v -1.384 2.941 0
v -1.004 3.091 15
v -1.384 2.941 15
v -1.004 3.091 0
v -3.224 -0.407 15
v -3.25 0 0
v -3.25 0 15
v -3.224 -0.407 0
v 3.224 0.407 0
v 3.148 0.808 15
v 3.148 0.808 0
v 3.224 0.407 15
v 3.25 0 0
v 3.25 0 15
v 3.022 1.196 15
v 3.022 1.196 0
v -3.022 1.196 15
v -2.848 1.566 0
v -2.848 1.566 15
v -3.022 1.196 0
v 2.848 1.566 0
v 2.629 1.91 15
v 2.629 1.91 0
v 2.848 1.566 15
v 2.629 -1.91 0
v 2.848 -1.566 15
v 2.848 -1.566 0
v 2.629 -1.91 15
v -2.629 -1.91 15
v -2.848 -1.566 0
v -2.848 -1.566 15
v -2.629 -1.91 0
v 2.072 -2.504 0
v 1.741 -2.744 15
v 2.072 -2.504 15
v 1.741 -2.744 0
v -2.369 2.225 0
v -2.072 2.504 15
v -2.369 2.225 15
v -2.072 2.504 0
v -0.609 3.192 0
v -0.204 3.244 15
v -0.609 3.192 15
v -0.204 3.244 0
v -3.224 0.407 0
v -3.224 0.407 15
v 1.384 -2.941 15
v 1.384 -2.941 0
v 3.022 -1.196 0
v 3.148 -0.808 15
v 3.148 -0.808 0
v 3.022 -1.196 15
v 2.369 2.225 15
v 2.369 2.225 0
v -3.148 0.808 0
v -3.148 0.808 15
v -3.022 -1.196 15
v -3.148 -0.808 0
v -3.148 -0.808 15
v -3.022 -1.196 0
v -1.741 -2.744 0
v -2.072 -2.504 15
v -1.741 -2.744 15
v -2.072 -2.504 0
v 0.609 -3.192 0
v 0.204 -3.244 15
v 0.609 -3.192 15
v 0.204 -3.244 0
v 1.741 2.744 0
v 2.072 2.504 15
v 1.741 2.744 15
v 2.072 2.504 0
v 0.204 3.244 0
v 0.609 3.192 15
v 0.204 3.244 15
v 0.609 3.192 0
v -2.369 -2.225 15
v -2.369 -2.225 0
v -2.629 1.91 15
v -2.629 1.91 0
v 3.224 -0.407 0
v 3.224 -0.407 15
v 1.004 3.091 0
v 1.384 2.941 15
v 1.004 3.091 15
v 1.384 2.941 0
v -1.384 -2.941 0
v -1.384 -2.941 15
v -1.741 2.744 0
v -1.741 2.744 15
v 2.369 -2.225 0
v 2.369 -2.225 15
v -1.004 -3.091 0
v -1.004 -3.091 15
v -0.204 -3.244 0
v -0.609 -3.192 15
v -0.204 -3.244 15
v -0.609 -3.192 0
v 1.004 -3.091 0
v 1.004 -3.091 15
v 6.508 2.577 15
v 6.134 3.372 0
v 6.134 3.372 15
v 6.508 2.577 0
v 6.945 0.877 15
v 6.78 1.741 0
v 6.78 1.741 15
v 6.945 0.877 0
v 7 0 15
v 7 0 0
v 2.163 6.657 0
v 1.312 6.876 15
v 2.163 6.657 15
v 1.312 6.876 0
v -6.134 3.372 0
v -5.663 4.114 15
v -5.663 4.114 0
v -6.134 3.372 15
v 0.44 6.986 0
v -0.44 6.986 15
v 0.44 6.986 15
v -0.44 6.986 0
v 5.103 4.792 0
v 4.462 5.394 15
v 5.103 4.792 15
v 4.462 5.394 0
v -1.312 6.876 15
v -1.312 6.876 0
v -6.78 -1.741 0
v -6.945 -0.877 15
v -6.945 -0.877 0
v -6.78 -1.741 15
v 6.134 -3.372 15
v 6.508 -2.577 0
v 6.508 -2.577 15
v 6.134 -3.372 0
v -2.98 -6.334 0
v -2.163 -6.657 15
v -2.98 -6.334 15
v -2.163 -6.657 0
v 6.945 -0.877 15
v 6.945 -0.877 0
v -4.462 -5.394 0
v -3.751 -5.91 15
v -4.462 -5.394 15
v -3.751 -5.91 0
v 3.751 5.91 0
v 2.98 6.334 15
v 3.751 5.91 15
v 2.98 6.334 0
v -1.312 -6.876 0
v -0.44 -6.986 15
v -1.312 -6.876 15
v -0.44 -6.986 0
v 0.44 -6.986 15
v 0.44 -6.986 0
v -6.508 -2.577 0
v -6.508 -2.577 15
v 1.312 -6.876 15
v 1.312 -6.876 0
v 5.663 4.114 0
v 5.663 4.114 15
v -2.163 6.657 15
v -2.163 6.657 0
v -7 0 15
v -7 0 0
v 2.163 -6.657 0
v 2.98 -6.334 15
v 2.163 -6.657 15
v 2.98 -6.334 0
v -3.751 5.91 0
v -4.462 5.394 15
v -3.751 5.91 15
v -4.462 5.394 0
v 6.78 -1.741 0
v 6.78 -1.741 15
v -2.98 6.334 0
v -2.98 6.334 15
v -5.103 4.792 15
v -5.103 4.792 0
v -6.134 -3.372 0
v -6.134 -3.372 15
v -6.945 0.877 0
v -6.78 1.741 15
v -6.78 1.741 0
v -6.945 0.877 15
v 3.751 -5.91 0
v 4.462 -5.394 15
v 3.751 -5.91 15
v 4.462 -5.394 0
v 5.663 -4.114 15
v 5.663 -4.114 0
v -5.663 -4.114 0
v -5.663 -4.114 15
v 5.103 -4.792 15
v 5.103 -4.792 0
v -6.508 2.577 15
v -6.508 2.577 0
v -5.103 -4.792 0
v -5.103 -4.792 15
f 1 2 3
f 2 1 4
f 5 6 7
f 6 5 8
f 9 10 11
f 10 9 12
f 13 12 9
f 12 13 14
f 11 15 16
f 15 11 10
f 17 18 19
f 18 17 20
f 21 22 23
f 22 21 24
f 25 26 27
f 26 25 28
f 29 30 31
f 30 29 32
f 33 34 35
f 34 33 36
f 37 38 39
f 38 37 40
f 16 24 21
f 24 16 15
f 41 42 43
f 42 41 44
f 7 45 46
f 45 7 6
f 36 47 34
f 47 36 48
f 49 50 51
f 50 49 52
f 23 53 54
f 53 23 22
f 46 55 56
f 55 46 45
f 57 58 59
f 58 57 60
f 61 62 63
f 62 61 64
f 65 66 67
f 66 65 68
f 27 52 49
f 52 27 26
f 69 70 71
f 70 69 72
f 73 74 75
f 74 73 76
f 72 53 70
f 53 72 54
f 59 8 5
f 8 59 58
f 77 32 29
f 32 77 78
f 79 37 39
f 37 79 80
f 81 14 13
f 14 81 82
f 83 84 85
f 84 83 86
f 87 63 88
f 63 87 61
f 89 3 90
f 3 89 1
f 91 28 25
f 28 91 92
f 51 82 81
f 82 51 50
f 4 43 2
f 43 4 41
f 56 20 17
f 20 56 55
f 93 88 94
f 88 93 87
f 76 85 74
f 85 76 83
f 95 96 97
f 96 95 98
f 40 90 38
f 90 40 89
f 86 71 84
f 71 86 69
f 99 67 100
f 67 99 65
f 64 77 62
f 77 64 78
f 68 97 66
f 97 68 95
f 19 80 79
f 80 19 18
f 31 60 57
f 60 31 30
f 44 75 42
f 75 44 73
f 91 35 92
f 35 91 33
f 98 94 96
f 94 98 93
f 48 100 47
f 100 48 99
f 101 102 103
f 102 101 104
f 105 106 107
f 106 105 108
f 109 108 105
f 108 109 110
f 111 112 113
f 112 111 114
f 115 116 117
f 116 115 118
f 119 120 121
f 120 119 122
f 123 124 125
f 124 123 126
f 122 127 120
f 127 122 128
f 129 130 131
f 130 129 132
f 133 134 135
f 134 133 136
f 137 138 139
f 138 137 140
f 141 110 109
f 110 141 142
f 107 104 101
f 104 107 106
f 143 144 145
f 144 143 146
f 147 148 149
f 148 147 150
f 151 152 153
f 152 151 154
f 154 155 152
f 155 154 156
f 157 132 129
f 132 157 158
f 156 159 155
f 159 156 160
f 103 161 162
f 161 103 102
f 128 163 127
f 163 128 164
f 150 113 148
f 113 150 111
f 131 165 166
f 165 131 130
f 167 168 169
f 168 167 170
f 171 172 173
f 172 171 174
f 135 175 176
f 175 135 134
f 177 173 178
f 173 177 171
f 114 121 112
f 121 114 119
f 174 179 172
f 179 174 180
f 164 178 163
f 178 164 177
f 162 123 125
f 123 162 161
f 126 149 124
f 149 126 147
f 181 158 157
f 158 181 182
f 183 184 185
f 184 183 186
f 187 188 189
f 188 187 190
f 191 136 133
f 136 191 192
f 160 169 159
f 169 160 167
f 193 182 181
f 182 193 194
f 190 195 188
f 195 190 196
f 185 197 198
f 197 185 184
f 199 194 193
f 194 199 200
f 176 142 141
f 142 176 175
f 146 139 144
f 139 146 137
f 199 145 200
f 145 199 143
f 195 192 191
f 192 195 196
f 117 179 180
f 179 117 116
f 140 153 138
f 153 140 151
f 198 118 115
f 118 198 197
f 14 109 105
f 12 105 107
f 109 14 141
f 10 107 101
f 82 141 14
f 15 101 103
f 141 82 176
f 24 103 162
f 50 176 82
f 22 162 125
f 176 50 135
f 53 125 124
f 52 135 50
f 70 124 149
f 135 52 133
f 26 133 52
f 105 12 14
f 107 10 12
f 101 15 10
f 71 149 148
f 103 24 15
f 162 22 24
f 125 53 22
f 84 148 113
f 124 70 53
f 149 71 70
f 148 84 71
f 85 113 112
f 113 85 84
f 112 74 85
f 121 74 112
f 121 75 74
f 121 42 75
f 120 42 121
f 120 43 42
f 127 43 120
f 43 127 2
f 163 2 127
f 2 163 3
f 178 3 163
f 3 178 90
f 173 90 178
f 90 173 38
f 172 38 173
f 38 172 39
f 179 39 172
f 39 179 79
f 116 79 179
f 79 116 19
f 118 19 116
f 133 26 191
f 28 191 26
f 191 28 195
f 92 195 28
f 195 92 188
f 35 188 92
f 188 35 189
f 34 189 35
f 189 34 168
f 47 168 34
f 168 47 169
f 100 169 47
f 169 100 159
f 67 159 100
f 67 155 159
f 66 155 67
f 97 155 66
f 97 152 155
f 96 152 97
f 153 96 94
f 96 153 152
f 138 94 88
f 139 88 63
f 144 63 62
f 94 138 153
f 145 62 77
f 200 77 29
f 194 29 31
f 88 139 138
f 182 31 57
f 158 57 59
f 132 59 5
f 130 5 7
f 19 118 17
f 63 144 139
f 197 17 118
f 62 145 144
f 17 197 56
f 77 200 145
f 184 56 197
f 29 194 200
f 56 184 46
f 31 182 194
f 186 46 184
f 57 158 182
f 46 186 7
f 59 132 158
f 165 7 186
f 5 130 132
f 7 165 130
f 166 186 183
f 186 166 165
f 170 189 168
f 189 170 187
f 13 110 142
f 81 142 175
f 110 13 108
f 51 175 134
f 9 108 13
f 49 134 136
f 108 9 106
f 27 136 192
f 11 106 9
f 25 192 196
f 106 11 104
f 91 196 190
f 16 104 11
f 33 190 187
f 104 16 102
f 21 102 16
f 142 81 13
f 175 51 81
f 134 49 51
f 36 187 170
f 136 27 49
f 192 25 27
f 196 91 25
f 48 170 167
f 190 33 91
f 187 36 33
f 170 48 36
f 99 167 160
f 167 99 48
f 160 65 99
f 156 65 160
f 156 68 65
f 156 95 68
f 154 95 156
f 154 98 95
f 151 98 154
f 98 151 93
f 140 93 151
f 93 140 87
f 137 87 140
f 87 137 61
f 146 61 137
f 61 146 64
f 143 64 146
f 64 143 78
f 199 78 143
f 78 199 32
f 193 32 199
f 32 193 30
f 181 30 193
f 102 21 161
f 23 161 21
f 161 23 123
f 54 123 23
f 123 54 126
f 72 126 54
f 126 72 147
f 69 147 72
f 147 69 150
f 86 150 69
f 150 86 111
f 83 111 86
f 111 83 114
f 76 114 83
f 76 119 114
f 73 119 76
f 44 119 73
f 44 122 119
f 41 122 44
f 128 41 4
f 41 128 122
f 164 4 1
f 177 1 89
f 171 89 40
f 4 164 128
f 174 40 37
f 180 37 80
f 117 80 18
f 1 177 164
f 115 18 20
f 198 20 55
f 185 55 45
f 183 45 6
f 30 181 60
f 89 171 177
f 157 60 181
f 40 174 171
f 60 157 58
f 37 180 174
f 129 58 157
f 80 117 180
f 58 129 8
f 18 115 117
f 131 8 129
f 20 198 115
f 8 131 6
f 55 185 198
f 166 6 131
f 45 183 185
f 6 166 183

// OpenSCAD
$fn = 50;


difference() {
	union() {
		cylinder(h = 15, r = 7.0000000000);
	}
	union() {
		translate(v = [0, 0, -100]) {
			cylinder(h = 200, r = 3.2500000000);
		}
		translate(v = [0, 0, -100]) {
			cylinder(h = 200, r = 1.8000000000);
		}
	}
}
